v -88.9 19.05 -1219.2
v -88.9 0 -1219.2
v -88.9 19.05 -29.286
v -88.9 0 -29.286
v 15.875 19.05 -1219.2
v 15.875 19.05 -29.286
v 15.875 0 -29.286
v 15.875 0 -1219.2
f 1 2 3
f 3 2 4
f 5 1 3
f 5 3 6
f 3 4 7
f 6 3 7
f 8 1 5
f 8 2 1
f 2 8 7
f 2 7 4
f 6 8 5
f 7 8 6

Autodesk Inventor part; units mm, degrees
ref_plane "YZ Plane" through (0, 0, 0) normal (1, 0, 0) x (0, 1, 0)
ref_plane "XZ Plane" through (0, 0, 0) normal (0, 1, 0) x (-1, 0, 0)
ref_plane "XY Plane" through (0, 0, 0) normal (0, 0, 1) x (1, 0, 0)
sketch "Sketch1" plane through (0, 0, 0) normal (0, 1, 0) x (-1, 0, 0)
  line L0 (0, 0) -> (88.9, 0)
  line L1 (88.9, 0) -> (88.9, -1219.2)
  line L2 (88.9, -1219.2) -> (0, -1219.2)
  line L3 (0, -1219.2) -> (0, 0)
  dimension "d0" = 88.9
  dimension "d1" = 1219.2
extrude "Extrusion1" add sketch "Sketch1" along normal blind 3.175
sketch "Sketch2" plane through (0, 0, 0) normal (1, 0, 0) x (0, 0, -1)
  line L0 (1219.2, 0) -> (0, 0) projected
  line L1 (1219.2, 0) -> (1219.2, 3.175) projected
  line L2 (0, 3.175) -> (1219.2, 3.175) projected
  line L3 (0, 0) -> (0, 3.175) projected
extrude "Extrusion2" add sketch "Sketch2" along normal blind 15.875
sketch "Sketch3" plane through (-88.9, 0, 0) normal (0, 0, 1) x (1, 0, 0)
  line L0 (104.775, 0) -> (0, 0) projected
  line L1 (104.775, 3.175) -> (104.775, 0) projected
  line L2 (0, 3.175) -> (104.775, 3.175) projected
  line L3 (0, 0) -> (0, 3.175) projected
  point P0 (88.9, 0)
extrude "Extrusion3" cut sketch "Sketch3" against normal blind 29.2862
sketch "Sketch4" plane through (0, 3.175, 0) normal (0, 1, 0) x (1, 0, 0)
  line L0 (-88.9, 29.2862) -> (15.875, 29.2862) projected
  line L1 (15.875, 1219.2) -> (15.875, 29.2862) projected
  line L2 (-88.9, 1219.2) -> (15.875, 1219.2) projected
  line L3 (-88.9, 1219.2) -> (-88.9, 29.2862) projected
  point P0 (0, 0)
extrude "Extrusion4" add sketch "Sketch4" along normal blind 15.875
properties part number "48in k wool"
